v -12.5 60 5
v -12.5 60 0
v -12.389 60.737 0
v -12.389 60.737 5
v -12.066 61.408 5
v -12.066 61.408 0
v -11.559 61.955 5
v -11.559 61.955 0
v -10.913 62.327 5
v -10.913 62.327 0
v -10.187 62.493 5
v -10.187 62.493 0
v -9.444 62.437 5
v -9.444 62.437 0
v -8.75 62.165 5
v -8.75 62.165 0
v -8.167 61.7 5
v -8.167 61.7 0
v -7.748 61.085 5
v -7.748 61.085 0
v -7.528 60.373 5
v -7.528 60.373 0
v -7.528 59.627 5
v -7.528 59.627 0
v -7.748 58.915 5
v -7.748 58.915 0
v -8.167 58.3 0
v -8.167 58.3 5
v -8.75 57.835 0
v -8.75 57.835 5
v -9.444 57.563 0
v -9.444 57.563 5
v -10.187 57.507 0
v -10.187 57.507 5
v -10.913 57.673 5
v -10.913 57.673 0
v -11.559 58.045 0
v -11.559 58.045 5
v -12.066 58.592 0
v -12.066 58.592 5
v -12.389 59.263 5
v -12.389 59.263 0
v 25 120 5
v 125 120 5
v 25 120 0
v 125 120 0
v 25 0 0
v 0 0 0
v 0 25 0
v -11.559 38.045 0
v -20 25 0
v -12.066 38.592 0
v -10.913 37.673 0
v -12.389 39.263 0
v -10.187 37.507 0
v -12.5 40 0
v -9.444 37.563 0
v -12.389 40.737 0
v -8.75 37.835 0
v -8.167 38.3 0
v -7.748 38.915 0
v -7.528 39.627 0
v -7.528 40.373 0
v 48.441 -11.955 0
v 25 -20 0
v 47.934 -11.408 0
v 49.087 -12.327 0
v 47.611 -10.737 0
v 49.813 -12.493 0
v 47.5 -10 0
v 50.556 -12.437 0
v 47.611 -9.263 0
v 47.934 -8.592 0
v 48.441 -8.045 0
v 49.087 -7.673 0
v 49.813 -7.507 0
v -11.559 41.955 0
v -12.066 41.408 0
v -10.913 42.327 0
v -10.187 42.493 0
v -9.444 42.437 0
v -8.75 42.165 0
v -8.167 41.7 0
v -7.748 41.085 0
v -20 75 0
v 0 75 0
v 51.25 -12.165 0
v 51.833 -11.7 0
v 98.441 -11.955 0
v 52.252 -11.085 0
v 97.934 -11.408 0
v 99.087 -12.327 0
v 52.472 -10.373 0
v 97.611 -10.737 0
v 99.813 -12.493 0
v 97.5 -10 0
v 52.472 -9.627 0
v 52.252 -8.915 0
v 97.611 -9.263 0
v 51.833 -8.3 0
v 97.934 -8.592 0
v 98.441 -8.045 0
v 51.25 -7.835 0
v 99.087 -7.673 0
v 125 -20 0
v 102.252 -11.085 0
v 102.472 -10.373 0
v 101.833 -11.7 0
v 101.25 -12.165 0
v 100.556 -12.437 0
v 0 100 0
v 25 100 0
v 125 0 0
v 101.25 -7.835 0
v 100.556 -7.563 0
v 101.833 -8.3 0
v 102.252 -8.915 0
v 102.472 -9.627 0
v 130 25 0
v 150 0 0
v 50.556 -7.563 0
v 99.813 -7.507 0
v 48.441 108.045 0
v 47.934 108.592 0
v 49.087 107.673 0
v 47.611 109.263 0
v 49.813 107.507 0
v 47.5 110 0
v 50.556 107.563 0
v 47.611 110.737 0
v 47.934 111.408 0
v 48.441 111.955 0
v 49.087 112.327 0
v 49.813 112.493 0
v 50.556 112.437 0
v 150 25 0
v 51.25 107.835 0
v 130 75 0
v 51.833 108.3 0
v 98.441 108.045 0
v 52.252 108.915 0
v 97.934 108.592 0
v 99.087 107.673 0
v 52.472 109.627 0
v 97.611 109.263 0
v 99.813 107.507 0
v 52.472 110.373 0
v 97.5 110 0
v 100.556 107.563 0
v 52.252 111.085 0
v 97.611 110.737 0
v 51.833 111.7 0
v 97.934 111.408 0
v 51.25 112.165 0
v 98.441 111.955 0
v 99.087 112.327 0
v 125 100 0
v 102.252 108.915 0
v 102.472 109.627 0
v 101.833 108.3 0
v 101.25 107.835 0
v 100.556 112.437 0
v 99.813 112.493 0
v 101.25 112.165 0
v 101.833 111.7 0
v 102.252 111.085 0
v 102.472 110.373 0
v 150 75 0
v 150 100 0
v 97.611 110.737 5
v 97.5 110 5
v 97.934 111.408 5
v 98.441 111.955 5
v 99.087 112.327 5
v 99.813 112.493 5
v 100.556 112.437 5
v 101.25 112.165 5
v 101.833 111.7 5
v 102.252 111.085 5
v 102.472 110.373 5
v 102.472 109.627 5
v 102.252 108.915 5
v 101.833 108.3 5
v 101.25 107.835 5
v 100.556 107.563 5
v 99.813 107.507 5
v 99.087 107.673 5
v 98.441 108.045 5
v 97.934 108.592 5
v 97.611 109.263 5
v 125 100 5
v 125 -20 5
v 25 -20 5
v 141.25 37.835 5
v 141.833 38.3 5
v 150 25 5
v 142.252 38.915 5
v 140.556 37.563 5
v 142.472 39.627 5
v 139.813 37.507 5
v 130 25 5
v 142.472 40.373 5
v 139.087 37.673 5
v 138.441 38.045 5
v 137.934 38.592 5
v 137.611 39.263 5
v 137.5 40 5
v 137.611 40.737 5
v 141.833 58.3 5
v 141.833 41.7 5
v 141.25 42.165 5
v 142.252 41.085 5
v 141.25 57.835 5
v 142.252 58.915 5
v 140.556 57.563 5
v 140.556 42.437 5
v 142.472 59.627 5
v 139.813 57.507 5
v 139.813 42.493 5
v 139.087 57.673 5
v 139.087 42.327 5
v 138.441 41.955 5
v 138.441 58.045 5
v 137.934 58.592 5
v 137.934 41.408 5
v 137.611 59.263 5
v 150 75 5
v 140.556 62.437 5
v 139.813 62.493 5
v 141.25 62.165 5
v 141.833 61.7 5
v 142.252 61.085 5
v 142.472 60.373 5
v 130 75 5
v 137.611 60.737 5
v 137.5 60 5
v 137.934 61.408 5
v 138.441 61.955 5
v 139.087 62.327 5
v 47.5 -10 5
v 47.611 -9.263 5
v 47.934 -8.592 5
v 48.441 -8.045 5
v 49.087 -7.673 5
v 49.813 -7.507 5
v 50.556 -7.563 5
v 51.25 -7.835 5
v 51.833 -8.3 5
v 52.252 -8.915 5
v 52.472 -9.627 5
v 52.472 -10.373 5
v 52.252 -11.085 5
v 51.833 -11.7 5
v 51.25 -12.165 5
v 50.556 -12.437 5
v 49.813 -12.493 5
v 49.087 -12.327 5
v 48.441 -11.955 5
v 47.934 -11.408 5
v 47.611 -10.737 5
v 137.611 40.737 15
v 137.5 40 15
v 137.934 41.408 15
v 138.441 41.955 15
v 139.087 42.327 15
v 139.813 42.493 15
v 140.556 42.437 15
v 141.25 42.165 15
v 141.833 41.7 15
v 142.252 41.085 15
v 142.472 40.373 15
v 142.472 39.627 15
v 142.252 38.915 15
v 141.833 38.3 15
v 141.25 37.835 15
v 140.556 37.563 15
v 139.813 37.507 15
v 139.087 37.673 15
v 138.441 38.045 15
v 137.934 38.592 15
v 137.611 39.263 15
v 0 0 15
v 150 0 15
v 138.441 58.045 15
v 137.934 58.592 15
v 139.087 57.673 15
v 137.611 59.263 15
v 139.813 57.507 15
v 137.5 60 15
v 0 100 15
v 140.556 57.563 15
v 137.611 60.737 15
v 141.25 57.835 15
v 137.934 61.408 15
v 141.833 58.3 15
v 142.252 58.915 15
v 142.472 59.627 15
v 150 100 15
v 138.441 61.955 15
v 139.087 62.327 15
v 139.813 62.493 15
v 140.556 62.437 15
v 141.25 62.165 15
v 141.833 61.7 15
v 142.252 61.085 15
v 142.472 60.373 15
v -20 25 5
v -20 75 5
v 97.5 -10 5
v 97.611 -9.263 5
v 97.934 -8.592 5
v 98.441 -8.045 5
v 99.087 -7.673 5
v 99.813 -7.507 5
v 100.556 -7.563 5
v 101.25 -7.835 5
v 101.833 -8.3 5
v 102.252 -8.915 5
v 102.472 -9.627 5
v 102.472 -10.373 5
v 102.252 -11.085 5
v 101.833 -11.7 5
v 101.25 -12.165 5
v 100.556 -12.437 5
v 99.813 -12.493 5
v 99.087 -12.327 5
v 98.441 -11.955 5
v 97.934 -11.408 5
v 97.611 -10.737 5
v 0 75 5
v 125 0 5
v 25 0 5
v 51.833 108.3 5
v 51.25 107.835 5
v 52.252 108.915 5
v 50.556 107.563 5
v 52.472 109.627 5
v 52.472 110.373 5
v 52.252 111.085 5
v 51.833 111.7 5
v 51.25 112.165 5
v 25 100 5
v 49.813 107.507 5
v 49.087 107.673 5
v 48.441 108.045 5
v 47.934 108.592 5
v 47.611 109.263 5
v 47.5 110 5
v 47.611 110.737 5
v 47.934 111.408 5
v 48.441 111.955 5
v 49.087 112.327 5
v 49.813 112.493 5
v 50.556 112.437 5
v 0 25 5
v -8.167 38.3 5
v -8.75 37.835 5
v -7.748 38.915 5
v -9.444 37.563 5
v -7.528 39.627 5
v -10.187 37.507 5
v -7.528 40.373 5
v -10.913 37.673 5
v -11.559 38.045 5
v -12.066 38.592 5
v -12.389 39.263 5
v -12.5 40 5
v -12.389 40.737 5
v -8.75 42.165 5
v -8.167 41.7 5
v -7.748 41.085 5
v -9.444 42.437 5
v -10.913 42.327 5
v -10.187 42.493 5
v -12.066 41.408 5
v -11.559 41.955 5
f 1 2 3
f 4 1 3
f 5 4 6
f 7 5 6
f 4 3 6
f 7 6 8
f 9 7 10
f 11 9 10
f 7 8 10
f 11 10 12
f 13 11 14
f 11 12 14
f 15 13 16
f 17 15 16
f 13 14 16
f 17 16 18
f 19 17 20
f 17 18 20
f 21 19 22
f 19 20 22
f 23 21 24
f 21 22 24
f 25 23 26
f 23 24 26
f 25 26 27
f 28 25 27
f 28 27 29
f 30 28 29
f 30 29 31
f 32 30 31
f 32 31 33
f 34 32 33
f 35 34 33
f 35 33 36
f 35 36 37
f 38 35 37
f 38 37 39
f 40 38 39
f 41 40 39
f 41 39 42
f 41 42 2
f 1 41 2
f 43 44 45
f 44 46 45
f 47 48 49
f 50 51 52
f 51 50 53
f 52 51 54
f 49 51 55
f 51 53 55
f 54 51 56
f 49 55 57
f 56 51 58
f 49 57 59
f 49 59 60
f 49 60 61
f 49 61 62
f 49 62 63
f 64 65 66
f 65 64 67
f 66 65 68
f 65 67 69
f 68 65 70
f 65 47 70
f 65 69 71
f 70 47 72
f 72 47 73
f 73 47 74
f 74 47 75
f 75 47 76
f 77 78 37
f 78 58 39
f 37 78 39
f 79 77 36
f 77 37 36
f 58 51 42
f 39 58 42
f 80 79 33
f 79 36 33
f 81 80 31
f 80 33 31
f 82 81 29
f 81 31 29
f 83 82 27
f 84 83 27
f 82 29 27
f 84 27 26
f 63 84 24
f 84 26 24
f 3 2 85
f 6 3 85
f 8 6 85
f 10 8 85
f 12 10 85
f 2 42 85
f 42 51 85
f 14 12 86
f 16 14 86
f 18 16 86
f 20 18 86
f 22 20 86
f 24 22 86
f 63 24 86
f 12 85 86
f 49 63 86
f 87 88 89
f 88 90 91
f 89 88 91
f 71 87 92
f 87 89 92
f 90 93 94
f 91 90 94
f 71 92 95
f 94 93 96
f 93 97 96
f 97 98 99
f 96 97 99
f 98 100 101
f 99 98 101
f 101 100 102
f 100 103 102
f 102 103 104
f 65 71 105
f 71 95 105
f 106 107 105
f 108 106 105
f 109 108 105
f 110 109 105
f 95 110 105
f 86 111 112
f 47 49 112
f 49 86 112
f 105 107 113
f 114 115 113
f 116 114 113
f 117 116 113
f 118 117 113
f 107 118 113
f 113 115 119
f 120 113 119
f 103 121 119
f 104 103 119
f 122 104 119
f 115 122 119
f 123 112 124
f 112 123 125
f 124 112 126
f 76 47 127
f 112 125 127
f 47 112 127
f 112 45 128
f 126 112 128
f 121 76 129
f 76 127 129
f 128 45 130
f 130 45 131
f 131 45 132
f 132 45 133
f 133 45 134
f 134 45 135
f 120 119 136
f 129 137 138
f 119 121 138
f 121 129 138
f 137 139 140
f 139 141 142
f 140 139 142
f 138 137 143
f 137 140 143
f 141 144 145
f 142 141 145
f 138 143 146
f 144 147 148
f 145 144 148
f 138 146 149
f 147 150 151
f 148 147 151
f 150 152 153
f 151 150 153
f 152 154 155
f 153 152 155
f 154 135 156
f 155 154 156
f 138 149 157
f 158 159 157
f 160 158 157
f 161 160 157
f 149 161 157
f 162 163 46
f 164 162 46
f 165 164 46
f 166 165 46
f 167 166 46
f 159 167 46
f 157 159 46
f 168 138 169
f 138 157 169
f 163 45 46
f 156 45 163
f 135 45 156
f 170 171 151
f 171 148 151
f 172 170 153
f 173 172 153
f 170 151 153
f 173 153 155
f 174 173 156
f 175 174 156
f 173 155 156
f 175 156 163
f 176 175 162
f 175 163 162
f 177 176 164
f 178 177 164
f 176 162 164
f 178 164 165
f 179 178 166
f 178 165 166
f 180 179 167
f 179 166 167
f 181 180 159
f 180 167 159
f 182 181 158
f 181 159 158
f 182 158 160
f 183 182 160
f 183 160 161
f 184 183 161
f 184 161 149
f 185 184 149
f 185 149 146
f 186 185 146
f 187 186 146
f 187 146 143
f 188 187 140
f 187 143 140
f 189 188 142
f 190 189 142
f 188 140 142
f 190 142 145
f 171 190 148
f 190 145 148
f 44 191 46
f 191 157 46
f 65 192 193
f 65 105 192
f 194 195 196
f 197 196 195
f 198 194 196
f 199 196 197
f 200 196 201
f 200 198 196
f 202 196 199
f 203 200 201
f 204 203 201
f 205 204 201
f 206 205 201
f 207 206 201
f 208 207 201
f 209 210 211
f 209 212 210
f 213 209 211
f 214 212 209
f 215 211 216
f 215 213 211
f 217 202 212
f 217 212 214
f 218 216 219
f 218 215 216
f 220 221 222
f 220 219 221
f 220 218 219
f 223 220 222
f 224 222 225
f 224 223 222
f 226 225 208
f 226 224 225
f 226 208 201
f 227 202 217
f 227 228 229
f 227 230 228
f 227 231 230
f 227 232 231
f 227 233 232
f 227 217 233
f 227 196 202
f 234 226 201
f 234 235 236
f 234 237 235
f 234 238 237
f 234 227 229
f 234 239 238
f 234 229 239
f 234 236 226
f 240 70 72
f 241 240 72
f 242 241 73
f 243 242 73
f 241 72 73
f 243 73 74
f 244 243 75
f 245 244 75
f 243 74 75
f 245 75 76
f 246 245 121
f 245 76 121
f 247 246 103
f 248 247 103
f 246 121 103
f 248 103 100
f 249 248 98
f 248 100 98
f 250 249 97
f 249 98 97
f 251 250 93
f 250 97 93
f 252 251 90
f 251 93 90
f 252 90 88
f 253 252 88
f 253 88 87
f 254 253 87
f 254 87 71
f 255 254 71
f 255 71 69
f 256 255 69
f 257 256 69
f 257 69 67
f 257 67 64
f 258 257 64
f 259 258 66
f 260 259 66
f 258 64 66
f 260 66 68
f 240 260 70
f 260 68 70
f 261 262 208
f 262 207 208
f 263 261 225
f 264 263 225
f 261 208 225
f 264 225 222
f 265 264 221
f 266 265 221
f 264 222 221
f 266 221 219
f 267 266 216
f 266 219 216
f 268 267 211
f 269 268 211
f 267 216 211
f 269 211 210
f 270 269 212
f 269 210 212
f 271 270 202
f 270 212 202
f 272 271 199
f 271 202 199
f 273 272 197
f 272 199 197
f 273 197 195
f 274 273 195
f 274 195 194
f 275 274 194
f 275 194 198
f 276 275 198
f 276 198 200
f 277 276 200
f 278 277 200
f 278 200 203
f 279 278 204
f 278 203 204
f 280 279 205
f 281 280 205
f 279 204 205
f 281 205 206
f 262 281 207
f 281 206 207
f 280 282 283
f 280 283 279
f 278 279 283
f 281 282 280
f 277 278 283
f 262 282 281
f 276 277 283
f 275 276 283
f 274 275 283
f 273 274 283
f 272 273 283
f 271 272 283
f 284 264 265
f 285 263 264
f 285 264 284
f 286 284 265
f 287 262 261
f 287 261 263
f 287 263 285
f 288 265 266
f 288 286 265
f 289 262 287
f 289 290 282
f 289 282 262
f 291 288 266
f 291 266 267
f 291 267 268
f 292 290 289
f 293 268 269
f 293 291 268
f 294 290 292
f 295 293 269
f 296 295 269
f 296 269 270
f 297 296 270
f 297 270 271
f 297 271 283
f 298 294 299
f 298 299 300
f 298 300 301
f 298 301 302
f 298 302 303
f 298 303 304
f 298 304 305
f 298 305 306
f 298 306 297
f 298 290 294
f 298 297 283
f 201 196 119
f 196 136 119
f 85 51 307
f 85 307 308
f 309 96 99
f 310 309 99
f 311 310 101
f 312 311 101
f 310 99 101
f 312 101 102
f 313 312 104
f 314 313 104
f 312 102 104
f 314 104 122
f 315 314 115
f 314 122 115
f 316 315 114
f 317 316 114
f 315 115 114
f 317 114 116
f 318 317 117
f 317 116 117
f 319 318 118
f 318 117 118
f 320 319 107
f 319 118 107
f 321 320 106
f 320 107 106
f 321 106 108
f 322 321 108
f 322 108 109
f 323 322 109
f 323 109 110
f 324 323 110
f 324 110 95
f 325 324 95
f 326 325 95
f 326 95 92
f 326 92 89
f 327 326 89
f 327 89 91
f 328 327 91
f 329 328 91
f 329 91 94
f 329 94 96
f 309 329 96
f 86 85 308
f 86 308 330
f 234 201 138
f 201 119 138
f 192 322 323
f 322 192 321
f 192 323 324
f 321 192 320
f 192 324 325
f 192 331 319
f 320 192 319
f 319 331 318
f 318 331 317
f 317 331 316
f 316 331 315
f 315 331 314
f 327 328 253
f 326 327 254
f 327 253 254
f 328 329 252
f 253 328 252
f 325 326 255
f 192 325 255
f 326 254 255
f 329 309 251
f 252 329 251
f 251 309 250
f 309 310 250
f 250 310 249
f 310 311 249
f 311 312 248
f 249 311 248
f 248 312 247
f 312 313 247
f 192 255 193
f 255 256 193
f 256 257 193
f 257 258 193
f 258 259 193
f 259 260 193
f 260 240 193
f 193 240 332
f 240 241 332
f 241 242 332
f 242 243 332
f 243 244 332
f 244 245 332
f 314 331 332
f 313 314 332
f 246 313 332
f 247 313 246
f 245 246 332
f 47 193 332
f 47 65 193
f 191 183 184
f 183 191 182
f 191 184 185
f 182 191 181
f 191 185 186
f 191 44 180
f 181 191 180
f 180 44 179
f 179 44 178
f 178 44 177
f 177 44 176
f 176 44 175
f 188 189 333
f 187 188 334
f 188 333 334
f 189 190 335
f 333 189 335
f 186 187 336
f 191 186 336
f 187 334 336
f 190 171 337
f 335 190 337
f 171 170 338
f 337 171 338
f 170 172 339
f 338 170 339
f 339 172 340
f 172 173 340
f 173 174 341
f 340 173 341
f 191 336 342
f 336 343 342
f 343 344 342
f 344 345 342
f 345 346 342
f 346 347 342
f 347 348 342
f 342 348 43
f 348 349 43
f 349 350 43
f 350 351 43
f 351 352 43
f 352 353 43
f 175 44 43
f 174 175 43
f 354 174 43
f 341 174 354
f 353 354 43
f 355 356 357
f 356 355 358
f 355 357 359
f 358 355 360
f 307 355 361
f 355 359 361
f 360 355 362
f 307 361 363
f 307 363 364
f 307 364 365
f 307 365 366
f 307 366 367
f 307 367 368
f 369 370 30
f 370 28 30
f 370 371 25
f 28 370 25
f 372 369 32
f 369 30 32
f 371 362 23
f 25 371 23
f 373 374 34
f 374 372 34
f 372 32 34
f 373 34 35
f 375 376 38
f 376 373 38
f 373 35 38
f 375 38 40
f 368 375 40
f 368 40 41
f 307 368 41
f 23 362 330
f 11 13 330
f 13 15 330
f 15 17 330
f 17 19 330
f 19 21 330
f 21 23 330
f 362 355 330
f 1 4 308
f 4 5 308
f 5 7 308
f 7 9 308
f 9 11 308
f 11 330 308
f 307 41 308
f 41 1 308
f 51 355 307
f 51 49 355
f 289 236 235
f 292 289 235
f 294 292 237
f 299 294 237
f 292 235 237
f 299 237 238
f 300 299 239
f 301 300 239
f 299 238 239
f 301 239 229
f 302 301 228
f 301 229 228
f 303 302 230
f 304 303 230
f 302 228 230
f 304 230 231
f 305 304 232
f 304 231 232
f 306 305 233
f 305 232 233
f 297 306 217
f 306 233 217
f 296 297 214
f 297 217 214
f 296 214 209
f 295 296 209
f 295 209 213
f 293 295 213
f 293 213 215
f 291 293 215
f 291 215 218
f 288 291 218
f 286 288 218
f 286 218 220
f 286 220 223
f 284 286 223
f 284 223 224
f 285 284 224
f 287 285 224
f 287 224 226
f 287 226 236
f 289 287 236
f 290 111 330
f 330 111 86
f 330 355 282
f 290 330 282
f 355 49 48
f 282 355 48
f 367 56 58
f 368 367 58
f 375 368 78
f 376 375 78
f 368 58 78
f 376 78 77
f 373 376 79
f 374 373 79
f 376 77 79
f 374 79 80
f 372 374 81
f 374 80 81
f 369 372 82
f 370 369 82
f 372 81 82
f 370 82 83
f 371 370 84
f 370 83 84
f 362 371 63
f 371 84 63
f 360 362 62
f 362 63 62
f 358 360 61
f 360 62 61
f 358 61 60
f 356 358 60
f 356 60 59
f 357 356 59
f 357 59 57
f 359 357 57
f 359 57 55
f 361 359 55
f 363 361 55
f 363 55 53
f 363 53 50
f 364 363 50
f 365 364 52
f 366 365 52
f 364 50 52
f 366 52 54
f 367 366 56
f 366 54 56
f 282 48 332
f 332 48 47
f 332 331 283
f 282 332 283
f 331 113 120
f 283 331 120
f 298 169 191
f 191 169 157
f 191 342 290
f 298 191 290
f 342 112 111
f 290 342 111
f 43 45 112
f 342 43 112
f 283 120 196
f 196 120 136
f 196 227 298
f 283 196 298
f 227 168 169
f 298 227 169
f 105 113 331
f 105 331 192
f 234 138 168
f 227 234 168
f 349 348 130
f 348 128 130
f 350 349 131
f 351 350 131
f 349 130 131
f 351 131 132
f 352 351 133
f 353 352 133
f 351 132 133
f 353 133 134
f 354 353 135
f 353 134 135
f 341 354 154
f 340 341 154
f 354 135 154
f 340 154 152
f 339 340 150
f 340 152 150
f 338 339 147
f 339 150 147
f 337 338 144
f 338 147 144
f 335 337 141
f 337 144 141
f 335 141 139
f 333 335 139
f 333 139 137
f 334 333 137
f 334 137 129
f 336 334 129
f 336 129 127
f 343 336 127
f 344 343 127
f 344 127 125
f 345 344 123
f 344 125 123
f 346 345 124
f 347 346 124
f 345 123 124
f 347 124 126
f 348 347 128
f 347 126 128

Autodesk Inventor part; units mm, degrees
ref_plane "YZ Plane" through (0, 0, 0) normal (1, 0, 0) x (0, 1, 0)
ref_plane "XZ Plane" through (0, 0, 0) normal (0, 1, 0) x (-1, 0, 0)
ref_plane "XY Plane" through (0, 0, 0) normal (0, 0, 1) x (1, 0, 0)
sketch "Sketch1" plane through (0, 0, 0) normal (0, 0, 1) x (1, 0, 0)
  line L0 (0, 0) -> (150, 0)
  line L1 (150, 0) -> (150, 100)
  line L2 (150, 100) -> (0, 100)
  line L3 (0, 100) -> (0, 0)
  dimension "d0" = 150
  dimension "d1" = 100
extrude "Extrusion1" add sketch "Sketch1" along normal blind 15
sketch "Sketch7" plane through (0, 0, 0) normal (0, 0, -1) x (-1, 0, 0)
  line L0 (0, 25) -> (20, 25)
  line L1 (20, 25) -> (20, 75)
  line L2 (20, 75) -> (0, 75)
  line L3 (0, 75) -> (0, 25)
  point P0 (0, 0)
  dimension "d27" = 20
  dimension "d28" = 50
  dimension "d29" = 25
extrude "Extrusion7" add sketch "Sketch7" against normal blind 5
sketch "Sketch8" plane through (0, 0, 0) normal (0, 0, -1) x (-1, 0, 0)
  line L0 (-25, 0) -> (-125, 0)
  line L1 (-125, 0) -> (-125, -20)
  line L2 (-125, -20) -> (-25, -20)
  line L3 (-25, -20) -> (-25, 0)
  line L4 (-150, 100) -> (0, 100) projected
  line L5 (-25, 100) -> (-125, 100)
  line L6 (-125, 100) -> (-125, 120)
  line L7 (-125, 120) -> (-25, 120)
  line L8 (-25, 120) -> (-25, 100)
  point P0 (0, 0)
  dimension "d32" = 100
  dimension "d33" = 20
  dimension "d34" = 25
  dimension "d37" = 100
  dimension "d38" = 20
extrude "Extrusion8" add sketch "Sketch8" against normal blind 5
sketch "Sketch9" plane through (0, 0, 0) normal (0, 0, -1) x (-1, 0, 0)
  circle A0 centre (-50, -10) radius 2.5
  circle A1 centre (-100, -10) radius 2.5
  line L0 (-25, -20) -> (-25, 0) projected
  line L1 (-125, 0) -> (-125, -20) projected
  line L2 (-25, 0) -> (-125, 0) projected
  circle A2 centre (-50, 110) radius 2.5
  circle A3 centre (-100, 110) radius 2.5
  line L3 (-125, 120) -> (-25, 120) projected
  circle A4 centre (10, 40) radius 2.5
  circle A5 centre (10, 60) radius 2.5
  line L4 (0, 75) -> (0, 25) projected
  line L5 (0, 25) -> (20, 25) projected
  line L6 (20, 75) -> (0, 75) projected
  point P0 (0, 0)
  dimension "d39" = 5
  dimension "d40" = 5
  dimension "d41" = 25
  dimension "d42" = 25
  dimension "d43" = 10
  dimension "d44" = 5
  dimension "d45" = 5
  dimension "d46" = 10
  dimension "d47" = 5
  dimension "d48" = 5
  dimension "d49" = 10
  dimension "d50" = 15
  dimension "d51" = 15
extrude "Extrusion9" cut sketch "Sketch9" against normal through all
thread "Thread1" size "M5x0.8" class "6H" standard "ANSI Metric M Profile" full length
thread "Thread2" size "M5x0.8" class "6H" standard "ANSI Metric M Profile" full length
thread "Thread3" size "M5x0.8" class "6H" standard "ANSI Metric M Profile" full length
thread "Thread4" size "M5x0.8" class "6H" standard "ANSI Metric M Profile" full length
thread "Thread5" size "M5x0.8" class "6H" standard "ANSI Metric M Profile" full length
thread "Thread6" size "M5x0.8" class "6H" standard "ANSI Metric M Profile" full length
sketch "Sketch10" plane through (0, 0, 0) normal (0, 0, -1) x (-1, 0, 0)
  line L0 (-150, 0) -> (-150, 100) projected
  line L1 (-150, 25) -> (-130, 25)
  line L2 (-130, 25) -> (-130, 75)
  line L3 (-130, 75) -> (-150, 75)
  line L4 (-150, 75) -> (-150, 25)
  circle A0 centre (10, 40) radius 2.5 projected
  circle A1 centre (-50, 110) radius 2.5 projected
  circle A2 centre (-50, -10) radius 2.5 projected
  circle A3 centre (-100, -10) radius 2.5 projected
  circle A4 centre (-100, 110) radius 2.5 projected
  circle A5 centre (10, 60) radius 2.5 projected
  line L5 (0, 0) -> (-25, 0) projected
  line L6 (0, 25) -> (0, 0) projected
  line L7 (0, 25) -> (20, 25) projected
  line L8 (20, 25) -> (20, 75) projected
  line L9 (20, 75) -> (0, 75) projected
  line L10 (0, 100) -> (0, 75) projected
  line L11 (-25, 100) -> (0, 100) projected
  line L12 (-25, 120) -> (-25, 100) projected
  line L13 (-125, 120) -> (-25, 120) projected
  line L14 (-125, 100) -> (-125, 120) projected
  line L15 (-150, 100) -> (-125, 100) projected
  line L16 (-150, 0) -> (-150, 100) projected
  line L17 (-125, 0) -> (-150, 0) projected
  line L18 (-125, 0) -> (-125, -20) projected
  line L19 (-125, -20) -> (-25, -20) projected
  line L20 (-25, -20) -> (-25, 0) projected
  dimension "d66" = 20
  dimension "d67" = 50
extrude "Extrusion10" cut sketch "Sketch10" against normal blind 5 contours L0 L3 L2 L1
sketch "Sketch11" plane through (0, 0, 5) normal (0, 0, -1) x (-1, 0, 0)
  circle A0 centre (-140, 60) radius 2.5
  circle A1 centre (-140, 40) radius 2.5
  line L0 (-130, 25) -> (-150, 25) projected
  line L1 (-150, 0) -> (-150, 25) projected
  line L2 (-125, 0) -> (-150, 0) projected
  line L3 (-125, 0) -> (-125, -20) projected
  line L4 (-125, -20) -> (-25, -20) projected
  line L5 (-25, -20) -> (-25, 0) projected
  line L6 (0, 0) -> (-25, 0) projected
  line L7 (0, 25) -> (0, 0) projected
  line L8 (0, 25) -> (20, 25) projected
  line L9 (20, 25) -> (20, 75) projected
  line L10 (20, 75) -> (0, 75) projected
  line L11 (0, 100) -> (0, 75) projected
  line L12 (-25, 100) -> (0, 100) projected
  line L13 (-25, 120) -> (-25, 100) projected
  line L14 (-125, 120) -> (-25, 120) projected
  line L15 (-125, 100) -> (-125, 120) projected
  line L16 (-150, 100) -> (-125, 100) projected
  line L17 (-150, 75) -> (-150, 100) projected
  line L18 (-150, 75) -> (-130, 75) projected
  line L19 (-130, 75) -> (-130, 25) projected
  circle A2 centre (10, 40) radius 2.5 projected
  circle A3 centre (-50, 110) radius 2.5 projected
  circle A4 centre (-50, -10) radius 2.5 projected
  circle A5 centre (-100, -10) radius 2.5 projected
  circle A6 centre (-100, 110) radius 2.5 projected
  circle A7 centre (10, 60) radius 2.5 projected
  line L20 (-150, 25) -> (-150, 75) projected
  dimension "d70" = 5
  dimension "d71" = 5
  dimension "d72" = 10
  dimension "d79" = 15
extrude "Extrusion11" cut sketch "Sketch11" against normal through all contours A0 | A1
thread "Thread7" size "M5x0.8" class "6H" standard "ANSI Metric M Profile" full length
thread "Thread8" size "M5x0.8" class "6H" standard "ANSI Metric M Profile" full length
properties part number "CP007" material "ABS Plastic"
